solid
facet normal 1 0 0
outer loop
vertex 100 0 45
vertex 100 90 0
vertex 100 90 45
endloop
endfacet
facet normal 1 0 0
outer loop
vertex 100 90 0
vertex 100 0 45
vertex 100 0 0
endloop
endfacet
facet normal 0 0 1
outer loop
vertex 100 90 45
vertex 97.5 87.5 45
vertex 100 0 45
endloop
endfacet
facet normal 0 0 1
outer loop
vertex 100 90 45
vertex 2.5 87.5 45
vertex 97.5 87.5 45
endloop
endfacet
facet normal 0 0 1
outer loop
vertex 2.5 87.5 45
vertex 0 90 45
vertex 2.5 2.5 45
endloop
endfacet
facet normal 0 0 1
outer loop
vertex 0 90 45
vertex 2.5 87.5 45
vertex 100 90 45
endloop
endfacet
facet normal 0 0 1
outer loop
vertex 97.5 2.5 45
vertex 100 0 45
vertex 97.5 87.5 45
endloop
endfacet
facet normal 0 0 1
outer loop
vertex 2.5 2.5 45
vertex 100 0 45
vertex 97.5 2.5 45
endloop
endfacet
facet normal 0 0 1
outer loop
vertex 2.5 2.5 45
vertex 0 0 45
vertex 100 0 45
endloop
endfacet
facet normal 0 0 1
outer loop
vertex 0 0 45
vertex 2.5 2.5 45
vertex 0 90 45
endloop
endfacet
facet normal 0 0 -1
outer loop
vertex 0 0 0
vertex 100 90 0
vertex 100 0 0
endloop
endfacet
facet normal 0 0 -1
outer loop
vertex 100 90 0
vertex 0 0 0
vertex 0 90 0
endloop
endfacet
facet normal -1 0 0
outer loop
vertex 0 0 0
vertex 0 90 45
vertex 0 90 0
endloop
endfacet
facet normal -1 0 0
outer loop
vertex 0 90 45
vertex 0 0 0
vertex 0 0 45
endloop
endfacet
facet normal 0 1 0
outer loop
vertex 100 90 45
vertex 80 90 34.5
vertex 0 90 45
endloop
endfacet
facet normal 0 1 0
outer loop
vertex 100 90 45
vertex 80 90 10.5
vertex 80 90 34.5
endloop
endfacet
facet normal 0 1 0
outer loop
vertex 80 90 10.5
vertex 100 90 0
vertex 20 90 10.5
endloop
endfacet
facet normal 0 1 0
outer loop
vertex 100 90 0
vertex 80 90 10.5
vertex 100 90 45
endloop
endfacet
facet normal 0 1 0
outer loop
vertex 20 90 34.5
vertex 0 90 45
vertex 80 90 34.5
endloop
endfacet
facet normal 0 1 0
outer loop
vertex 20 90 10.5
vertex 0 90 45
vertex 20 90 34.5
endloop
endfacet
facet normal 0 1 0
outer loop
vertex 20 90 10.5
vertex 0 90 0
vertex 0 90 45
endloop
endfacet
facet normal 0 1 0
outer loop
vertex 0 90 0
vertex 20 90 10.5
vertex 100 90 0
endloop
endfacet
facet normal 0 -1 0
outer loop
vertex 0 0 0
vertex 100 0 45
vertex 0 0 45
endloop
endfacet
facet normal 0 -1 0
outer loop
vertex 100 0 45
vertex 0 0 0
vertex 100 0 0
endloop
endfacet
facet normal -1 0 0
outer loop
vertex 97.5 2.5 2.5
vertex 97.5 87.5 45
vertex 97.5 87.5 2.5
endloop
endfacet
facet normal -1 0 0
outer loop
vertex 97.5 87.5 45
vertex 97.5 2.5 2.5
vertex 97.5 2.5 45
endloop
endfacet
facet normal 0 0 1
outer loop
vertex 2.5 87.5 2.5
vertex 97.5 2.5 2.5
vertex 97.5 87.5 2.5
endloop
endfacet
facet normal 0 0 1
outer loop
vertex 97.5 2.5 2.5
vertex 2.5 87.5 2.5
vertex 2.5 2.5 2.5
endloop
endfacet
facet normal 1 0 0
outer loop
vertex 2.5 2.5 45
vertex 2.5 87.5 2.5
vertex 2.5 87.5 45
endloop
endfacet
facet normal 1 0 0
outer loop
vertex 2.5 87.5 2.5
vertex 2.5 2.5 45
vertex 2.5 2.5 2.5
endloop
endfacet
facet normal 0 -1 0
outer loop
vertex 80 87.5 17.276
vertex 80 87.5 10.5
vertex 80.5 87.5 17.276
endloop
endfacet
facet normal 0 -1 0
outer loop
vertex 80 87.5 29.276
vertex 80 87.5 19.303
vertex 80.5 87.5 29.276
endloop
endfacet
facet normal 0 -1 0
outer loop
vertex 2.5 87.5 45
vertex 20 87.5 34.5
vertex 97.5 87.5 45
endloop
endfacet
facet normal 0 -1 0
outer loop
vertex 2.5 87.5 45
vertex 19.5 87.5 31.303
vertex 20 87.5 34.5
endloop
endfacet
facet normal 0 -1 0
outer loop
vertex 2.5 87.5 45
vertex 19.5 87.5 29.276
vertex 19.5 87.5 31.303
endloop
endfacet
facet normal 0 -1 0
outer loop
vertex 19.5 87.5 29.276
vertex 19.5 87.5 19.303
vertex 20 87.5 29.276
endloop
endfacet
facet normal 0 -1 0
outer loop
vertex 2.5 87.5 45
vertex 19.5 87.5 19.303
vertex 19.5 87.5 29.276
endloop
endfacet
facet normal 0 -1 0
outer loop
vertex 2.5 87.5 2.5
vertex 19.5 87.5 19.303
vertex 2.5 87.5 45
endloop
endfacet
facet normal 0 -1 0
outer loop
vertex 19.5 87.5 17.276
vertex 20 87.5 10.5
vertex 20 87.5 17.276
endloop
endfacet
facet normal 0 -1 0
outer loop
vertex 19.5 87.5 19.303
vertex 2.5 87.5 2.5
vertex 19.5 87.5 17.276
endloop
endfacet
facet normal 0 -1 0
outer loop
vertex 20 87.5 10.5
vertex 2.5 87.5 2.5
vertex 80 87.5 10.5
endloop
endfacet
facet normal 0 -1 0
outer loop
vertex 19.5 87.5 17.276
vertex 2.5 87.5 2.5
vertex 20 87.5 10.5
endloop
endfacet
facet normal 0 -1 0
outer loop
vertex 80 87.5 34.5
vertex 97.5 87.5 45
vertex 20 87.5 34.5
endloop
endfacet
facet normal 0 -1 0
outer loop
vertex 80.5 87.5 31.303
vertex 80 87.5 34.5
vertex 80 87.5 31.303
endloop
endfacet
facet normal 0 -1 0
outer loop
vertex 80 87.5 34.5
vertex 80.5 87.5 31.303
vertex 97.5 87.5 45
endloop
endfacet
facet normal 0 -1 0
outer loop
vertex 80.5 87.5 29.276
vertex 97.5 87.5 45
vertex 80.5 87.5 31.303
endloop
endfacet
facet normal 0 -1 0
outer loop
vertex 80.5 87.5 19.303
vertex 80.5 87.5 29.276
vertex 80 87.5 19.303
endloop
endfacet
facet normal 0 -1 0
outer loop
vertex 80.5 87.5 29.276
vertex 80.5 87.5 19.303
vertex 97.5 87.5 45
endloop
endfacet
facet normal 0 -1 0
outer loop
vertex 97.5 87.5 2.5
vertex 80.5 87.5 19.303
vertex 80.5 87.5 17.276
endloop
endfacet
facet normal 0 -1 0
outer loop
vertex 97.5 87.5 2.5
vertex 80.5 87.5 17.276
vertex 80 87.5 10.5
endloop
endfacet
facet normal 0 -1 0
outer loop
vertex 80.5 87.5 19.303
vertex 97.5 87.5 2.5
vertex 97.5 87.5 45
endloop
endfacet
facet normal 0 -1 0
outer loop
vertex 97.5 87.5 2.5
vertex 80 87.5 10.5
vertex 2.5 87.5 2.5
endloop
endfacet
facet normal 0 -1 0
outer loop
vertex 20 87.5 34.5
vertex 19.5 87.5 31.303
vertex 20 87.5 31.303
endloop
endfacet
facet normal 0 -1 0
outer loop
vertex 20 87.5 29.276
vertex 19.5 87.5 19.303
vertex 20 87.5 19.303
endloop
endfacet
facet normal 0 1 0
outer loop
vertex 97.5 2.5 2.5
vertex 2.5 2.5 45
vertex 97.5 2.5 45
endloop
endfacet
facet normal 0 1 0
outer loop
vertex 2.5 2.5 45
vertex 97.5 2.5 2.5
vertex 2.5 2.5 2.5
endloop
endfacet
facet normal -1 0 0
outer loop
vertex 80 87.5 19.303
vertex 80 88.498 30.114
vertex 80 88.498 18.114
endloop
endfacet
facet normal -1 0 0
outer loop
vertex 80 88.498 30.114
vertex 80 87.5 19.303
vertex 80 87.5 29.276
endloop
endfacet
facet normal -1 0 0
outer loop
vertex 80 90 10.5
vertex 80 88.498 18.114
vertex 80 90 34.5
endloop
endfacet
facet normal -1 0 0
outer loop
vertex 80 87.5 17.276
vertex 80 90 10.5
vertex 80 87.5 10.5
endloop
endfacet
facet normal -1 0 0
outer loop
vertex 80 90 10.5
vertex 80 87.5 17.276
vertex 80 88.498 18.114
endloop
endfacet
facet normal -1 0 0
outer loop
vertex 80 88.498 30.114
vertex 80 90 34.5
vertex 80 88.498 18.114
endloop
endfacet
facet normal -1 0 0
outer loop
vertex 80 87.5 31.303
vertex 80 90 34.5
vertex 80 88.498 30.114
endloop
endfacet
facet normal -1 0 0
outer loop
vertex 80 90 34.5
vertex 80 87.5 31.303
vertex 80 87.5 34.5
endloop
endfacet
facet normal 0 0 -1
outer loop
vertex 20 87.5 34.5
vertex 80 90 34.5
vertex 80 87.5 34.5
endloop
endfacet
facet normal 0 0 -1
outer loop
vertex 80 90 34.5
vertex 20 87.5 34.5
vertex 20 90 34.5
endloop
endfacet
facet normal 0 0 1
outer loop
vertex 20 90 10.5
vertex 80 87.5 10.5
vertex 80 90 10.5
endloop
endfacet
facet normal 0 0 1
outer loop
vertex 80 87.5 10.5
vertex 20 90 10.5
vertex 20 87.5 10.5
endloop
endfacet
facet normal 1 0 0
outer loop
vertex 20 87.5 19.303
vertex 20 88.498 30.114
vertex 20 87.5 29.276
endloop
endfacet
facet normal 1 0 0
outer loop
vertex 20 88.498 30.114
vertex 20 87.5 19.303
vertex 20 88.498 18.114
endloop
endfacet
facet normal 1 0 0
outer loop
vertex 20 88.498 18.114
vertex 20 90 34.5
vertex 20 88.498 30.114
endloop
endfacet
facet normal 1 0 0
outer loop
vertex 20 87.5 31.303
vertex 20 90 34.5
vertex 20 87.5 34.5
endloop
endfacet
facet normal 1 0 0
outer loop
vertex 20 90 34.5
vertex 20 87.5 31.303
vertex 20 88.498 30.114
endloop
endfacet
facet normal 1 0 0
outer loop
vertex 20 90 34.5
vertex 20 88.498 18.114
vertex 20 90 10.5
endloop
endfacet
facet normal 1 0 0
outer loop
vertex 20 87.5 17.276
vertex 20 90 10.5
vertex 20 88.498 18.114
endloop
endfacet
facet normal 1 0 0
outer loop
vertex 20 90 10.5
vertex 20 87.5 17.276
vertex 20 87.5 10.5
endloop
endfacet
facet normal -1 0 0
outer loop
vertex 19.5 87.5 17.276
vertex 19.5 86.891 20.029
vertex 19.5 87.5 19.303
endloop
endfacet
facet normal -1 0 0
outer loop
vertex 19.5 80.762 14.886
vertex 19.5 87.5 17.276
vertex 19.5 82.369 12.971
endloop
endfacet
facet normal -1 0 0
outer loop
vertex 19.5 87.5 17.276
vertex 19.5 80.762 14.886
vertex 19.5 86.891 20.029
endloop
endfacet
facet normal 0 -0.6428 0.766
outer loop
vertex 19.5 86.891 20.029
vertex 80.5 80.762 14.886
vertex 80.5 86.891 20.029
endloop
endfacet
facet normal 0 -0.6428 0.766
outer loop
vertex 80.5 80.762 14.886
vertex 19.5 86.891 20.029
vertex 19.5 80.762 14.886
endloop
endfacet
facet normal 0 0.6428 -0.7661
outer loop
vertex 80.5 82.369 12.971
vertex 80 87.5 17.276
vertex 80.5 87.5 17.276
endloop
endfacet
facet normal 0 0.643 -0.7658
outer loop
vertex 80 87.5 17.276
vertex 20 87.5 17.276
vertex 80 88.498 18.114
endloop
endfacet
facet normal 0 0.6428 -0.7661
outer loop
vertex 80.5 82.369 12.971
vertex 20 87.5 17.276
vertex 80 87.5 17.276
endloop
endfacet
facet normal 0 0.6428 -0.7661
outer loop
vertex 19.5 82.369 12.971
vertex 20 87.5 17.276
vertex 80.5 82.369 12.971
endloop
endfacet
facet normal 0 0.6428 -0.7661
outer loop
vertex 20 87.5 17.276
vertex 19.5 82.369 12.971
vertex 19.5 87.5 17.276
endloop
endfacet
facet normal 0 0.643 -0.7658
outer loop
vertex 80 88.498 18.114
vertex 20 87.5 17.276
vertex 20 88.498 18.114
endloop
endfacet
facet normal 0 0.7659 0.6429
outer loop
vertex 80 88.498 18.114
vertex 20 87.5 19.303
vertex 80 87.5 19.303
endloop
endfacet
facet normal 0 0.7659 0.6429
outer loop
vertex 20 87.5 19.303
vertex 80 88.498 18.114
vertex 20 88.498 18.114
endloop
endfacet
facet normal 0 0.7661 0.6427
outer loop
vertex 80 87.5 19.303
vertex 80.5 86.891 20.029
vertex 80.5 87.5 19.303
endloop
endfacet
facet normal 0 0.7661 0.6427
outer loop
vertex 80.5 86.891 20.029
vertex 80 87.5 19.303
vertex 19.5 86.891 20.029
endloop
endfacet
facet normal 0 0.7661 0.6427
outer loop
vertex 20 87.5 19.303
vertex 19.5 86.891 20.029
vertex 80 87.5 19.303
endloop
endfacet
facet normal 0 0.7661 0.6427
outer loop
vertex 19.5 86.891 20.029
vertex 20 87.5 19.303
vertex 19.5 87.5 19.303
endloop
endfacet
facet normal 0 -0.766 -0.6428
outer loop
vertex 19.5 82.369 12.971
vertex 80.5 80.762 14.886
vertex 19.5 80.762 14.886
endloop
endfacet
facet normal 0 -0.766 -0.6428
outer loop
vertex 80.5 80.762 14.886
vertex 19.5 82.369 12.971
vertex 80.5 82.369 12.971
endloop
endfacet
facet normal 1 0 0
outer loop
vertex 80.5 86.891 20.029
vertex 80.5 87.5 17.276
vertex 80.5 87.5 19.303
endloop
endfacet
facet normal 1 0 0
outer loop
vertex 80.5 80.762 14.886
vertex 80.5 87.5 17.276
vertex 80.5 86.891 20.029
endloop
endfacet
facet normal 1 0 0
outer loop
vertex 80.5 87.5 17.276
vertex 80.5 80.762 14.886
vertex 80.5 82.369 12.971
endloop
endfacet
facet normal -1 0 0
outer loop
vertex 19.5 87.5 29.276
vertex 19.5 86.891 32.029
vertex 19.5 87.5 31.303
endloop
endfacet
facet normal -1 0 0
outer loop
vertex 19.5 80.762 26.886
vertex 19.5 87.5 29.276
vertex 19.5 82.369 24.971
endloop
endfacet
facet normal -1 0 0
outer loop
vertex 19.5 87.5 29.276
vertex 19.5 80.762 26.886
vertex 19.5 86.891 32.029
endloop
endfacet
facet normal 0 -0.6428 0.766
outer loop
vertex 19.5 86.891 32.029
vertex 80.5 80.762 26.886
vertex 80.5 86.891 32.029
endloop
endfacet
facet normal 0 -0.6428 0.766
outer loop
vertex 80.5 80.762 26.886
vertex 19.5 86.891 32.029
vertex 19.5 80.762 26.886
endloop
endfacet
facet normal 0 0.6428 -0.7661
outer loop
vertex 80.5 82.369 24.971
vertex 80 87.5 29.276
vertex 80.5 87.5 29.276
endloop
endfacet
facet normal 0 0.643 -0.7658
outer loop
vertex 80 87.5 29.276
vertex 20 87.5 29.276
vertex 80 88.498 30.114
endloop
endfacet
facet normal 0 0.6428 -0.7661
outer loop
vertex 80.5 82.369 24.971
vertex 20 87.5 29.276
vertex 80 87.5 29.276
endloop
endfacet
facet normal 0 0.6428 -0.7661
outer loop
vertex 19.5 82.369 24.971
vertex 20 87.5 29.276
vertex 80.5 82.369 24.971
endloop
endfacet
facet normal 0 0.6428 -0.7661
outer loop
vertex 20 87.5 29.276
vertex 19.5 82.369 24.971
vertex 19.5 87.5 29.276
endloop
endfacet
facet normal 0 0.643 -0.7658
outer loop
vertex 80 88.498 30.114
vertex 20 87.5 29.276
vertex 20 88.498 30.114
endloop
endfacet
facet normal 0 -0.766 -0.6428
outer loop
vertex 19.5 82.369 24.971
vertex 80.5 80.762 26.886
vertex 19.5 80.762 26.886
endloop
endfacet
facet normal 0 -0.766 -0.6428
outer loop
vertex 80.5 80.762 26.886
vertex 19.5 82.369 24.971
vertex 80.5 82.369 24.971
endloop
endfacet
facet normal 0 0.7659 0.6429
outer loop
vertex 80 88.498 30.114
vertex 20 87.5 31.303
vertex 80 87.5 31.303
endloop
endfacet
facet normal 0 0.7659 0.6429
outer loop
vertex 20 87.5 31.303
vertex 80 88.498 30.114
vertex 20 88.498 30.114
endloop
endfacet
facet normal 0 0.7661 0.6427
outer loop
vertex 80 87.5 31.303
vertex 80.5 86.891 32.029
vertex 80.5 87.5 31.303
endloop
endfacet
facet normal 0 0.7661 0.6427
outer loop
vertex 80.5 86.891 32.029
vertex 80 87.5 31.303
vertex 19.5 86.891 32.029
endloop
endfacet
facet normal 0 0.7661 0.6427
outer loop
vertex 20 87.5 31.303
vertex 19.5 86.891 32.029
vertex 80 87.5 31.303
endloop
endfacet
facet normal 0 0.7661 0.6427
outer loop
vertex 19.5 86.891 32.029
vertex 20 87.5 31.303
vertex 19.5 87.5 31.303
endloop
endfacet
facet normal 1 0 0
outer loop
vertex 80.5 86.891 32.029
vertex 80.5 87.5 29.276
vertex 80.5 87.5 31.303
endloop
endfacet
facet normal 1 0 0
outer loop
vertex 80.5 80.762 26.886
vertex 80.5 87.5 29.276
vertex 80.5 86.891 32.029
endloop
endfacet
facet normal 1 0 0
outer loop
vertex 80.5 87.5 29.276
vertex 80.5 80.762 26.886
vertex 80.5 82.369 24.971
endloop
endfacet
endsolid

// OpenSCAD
$fn = 32;

// ----------------------------------------------------------------------
// Vent box: louvers enclosure
// ----------------------------------------------------------------------

// --- parameters (mm) ---
box_l = 100;              // box length, X
box_w = 90;               // box width, Y
box_h = 45;               // box height, Z
wall_t = 2.5;             // shell wall thickness
win_l = 60;               // vent window width, X
win_h = 24;               // vent window height, Z
slat_t = 2.5;             // louver slat thickness
slat_d = 8;               // louver slat depth
slat_a = 40;              // louver slat angle, degrees
slat_pitch = 12;          // louver pitch
slat_yc = 84.63;          // slat centreline Y

win_z0 = (box_h - win_h) / 2;  // window lower edge Z
n_slats = 2;  // louver count
slat_z0 = win_z0 + (win_h - (n_slats - 1) * slat_pitch) / 2;

difference() {
  union() {
    difference() {
      cube([box_l, box_w, box_h]);
  translate([wall_t, wall_t, wall_t])
    cube([box_l - 2 * wall_t, box_w - 2 * wall_t, box_h]);
  translate([(box_l - win_l) / 2, box_w - wall_t - 1, win_z0])
    cube([win_l, wall_t + 2, win_h]);
    }
    for (i = [0 : n_slats - 1])
      translate([box_l / 2, slat_yc, slat_z0 + i * slat_pitch])
        rotate([slat_a, 0, 0])
          cube([win_l + 1, slat_d, slat_t], center = true);
  }
}
